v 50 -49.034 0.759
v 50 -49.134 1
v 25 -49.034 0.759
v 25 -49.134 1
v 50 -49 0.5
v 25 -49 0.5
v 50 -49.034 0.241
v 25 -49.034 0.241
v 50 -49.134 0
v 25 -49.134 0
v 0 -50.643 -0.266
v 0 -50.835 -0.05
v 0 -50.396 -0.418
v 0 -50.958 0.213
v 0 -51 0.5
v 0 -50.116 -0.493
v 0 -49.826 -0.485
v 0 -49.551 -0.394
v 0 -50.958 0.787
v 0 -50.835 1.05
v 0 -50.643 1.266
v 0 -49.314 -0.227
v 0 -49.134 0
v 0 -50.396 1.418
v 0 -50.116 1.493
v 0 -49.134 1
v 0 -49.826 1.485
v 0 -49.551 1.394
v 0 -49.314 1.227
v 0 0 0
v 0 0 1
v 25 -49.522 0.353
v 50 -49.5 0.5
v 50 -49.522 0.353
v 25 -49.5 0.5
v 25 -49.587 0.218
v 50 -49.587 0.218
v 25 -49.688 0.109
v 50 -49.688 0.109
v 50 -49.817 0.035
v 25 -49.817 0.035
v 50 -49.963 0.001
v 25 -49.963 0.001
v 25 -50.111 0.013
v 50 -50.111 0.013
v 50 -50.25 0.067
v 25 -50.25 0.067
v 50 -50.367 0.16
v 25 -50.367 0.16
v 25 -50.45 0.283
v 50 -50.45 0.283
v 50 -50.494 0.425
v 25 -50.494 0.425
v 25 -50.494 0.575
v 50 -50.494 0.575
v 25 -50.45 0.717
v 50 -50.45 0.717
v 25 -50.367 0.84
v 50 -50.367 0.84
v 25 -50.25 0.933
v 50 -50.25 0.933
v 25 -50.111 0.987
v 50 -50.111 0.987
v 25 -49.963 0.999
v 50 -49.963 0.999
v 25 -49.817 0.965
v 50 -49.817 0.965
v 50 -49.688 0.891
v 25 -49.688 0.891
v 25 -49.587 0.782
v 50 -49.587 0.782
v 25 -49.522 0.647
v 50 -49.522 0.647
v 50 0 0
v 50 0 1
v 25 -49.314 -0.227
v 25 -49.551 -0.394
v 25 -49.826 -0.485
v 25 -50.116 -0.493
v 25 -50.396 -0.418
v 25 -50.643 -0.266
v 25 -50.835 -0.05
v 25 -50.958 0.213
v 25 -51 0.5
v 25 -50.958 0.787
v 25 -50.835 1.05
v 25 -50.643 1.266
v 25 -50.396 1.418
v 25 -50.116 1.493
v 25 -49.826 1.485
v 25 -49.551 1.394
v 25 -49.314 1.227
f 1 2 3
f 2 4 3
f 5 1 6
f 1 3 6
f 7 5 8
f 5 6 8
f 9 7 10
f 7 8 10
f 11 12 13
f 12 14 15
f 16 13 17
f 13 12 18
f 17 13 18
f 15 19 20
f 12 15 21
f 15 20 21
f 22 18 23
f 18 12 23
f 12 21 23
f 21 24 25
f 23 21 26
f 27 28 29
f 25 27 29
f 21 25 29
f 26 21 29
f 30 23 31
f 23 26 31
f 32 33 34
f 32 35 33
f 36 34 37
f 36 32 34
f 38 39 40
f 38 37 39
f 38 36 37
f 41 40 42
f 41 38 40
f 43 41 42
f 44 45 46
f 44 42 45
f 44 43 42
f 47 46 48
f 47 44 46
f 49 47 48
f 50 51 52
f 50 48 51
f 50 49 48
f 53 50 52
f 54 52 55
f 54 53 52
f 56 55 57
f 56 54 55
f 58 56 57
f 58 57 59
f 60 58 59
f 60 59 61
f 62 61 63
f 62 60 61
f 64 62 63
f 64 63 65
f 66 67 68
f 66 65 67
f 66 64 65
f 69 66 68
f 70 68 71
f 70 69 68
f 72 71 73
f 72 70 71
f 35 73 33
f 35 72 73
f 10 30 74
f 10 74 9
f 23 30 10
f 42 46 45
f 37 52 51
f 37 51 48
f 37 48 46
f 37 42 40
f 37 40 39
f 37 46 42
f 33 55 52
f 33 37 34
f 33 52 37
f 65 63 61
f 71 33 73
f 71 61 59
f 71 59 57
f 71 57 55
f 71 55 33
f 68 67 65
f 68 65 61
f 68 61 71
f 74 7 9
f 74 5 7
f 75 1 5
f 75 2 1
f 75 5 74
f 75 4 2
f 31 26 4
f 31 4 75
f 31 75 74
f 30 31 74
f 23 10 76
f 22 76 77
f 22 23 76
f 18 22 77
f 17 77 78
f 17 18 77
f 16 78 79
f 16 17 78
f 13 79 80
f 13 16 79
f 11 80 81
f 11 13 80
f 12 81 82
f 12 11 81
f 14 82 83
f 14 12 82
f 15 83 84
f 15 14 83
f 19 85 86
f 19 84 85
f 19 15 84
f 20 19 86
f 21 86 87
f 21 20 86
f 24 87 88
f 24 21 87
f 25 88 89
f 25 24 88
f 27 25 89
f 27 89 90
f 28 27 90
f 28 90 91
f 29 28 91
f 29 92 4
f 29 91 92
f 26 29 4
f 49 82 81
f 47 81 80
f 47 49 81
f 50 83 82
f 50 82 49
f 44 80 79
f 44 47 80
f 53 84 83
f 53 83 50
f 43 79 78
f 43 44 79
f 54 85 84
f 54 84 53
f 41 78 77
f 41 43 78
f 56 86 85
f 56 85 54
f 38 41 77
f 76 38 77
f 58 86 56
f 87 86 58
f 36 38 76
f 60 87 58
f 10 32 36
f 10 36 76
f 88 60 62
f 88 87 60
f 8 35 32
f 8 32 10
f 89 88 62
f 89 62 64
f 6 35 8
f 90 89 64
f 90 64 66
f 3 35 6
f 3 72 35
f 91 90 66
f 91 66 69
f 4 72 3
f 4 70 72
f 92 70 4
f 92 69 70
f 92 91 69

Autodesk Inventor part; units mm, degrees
ref_plane "YZ Plane" through (0, 0, 0) normal (1, 0, 0) x (0, 1, 0)
ref_plane "XZ Plane" through (0, 0, 0) normal (0, 1, 0) x (-1, 0, 0)
ref_plane "XY Plane" through (0, 0, 0) normal (0, 0, 1) x (1, 0, 0)
sketch "Szkic1" plane through (0, 0, 0) normal (1, 0, 0) x (0, 1, 0)
  line L0 (0, 0) -> (-49.134, 0)
  line L1 (-49.134, 1) -> (0, 1)
  line L2 (0, 1) -> (0, 0)
  circle A0 centre (-50, 0.5) radius 1
  circle A1 centre (-50, 0.5) radius 0.5
  dimension "d0" = 2
  dimension "d1" = 1
  dimension "d2" = 49.134
  dimension "d3" = 1
extrude "Wyciągnięcie proste1" add sketch "Szkic1" along normal blind 50 contours L0 A0 L1 L2
extrude "Wyciągnięcie proste2" add sketch "Szkic1" along normal blind 50 contours A1
extrude "Wyciągnięcie proste3" add sketch "Szkic1" along normal blind 25 contours A0
properties part number "zawias2"
